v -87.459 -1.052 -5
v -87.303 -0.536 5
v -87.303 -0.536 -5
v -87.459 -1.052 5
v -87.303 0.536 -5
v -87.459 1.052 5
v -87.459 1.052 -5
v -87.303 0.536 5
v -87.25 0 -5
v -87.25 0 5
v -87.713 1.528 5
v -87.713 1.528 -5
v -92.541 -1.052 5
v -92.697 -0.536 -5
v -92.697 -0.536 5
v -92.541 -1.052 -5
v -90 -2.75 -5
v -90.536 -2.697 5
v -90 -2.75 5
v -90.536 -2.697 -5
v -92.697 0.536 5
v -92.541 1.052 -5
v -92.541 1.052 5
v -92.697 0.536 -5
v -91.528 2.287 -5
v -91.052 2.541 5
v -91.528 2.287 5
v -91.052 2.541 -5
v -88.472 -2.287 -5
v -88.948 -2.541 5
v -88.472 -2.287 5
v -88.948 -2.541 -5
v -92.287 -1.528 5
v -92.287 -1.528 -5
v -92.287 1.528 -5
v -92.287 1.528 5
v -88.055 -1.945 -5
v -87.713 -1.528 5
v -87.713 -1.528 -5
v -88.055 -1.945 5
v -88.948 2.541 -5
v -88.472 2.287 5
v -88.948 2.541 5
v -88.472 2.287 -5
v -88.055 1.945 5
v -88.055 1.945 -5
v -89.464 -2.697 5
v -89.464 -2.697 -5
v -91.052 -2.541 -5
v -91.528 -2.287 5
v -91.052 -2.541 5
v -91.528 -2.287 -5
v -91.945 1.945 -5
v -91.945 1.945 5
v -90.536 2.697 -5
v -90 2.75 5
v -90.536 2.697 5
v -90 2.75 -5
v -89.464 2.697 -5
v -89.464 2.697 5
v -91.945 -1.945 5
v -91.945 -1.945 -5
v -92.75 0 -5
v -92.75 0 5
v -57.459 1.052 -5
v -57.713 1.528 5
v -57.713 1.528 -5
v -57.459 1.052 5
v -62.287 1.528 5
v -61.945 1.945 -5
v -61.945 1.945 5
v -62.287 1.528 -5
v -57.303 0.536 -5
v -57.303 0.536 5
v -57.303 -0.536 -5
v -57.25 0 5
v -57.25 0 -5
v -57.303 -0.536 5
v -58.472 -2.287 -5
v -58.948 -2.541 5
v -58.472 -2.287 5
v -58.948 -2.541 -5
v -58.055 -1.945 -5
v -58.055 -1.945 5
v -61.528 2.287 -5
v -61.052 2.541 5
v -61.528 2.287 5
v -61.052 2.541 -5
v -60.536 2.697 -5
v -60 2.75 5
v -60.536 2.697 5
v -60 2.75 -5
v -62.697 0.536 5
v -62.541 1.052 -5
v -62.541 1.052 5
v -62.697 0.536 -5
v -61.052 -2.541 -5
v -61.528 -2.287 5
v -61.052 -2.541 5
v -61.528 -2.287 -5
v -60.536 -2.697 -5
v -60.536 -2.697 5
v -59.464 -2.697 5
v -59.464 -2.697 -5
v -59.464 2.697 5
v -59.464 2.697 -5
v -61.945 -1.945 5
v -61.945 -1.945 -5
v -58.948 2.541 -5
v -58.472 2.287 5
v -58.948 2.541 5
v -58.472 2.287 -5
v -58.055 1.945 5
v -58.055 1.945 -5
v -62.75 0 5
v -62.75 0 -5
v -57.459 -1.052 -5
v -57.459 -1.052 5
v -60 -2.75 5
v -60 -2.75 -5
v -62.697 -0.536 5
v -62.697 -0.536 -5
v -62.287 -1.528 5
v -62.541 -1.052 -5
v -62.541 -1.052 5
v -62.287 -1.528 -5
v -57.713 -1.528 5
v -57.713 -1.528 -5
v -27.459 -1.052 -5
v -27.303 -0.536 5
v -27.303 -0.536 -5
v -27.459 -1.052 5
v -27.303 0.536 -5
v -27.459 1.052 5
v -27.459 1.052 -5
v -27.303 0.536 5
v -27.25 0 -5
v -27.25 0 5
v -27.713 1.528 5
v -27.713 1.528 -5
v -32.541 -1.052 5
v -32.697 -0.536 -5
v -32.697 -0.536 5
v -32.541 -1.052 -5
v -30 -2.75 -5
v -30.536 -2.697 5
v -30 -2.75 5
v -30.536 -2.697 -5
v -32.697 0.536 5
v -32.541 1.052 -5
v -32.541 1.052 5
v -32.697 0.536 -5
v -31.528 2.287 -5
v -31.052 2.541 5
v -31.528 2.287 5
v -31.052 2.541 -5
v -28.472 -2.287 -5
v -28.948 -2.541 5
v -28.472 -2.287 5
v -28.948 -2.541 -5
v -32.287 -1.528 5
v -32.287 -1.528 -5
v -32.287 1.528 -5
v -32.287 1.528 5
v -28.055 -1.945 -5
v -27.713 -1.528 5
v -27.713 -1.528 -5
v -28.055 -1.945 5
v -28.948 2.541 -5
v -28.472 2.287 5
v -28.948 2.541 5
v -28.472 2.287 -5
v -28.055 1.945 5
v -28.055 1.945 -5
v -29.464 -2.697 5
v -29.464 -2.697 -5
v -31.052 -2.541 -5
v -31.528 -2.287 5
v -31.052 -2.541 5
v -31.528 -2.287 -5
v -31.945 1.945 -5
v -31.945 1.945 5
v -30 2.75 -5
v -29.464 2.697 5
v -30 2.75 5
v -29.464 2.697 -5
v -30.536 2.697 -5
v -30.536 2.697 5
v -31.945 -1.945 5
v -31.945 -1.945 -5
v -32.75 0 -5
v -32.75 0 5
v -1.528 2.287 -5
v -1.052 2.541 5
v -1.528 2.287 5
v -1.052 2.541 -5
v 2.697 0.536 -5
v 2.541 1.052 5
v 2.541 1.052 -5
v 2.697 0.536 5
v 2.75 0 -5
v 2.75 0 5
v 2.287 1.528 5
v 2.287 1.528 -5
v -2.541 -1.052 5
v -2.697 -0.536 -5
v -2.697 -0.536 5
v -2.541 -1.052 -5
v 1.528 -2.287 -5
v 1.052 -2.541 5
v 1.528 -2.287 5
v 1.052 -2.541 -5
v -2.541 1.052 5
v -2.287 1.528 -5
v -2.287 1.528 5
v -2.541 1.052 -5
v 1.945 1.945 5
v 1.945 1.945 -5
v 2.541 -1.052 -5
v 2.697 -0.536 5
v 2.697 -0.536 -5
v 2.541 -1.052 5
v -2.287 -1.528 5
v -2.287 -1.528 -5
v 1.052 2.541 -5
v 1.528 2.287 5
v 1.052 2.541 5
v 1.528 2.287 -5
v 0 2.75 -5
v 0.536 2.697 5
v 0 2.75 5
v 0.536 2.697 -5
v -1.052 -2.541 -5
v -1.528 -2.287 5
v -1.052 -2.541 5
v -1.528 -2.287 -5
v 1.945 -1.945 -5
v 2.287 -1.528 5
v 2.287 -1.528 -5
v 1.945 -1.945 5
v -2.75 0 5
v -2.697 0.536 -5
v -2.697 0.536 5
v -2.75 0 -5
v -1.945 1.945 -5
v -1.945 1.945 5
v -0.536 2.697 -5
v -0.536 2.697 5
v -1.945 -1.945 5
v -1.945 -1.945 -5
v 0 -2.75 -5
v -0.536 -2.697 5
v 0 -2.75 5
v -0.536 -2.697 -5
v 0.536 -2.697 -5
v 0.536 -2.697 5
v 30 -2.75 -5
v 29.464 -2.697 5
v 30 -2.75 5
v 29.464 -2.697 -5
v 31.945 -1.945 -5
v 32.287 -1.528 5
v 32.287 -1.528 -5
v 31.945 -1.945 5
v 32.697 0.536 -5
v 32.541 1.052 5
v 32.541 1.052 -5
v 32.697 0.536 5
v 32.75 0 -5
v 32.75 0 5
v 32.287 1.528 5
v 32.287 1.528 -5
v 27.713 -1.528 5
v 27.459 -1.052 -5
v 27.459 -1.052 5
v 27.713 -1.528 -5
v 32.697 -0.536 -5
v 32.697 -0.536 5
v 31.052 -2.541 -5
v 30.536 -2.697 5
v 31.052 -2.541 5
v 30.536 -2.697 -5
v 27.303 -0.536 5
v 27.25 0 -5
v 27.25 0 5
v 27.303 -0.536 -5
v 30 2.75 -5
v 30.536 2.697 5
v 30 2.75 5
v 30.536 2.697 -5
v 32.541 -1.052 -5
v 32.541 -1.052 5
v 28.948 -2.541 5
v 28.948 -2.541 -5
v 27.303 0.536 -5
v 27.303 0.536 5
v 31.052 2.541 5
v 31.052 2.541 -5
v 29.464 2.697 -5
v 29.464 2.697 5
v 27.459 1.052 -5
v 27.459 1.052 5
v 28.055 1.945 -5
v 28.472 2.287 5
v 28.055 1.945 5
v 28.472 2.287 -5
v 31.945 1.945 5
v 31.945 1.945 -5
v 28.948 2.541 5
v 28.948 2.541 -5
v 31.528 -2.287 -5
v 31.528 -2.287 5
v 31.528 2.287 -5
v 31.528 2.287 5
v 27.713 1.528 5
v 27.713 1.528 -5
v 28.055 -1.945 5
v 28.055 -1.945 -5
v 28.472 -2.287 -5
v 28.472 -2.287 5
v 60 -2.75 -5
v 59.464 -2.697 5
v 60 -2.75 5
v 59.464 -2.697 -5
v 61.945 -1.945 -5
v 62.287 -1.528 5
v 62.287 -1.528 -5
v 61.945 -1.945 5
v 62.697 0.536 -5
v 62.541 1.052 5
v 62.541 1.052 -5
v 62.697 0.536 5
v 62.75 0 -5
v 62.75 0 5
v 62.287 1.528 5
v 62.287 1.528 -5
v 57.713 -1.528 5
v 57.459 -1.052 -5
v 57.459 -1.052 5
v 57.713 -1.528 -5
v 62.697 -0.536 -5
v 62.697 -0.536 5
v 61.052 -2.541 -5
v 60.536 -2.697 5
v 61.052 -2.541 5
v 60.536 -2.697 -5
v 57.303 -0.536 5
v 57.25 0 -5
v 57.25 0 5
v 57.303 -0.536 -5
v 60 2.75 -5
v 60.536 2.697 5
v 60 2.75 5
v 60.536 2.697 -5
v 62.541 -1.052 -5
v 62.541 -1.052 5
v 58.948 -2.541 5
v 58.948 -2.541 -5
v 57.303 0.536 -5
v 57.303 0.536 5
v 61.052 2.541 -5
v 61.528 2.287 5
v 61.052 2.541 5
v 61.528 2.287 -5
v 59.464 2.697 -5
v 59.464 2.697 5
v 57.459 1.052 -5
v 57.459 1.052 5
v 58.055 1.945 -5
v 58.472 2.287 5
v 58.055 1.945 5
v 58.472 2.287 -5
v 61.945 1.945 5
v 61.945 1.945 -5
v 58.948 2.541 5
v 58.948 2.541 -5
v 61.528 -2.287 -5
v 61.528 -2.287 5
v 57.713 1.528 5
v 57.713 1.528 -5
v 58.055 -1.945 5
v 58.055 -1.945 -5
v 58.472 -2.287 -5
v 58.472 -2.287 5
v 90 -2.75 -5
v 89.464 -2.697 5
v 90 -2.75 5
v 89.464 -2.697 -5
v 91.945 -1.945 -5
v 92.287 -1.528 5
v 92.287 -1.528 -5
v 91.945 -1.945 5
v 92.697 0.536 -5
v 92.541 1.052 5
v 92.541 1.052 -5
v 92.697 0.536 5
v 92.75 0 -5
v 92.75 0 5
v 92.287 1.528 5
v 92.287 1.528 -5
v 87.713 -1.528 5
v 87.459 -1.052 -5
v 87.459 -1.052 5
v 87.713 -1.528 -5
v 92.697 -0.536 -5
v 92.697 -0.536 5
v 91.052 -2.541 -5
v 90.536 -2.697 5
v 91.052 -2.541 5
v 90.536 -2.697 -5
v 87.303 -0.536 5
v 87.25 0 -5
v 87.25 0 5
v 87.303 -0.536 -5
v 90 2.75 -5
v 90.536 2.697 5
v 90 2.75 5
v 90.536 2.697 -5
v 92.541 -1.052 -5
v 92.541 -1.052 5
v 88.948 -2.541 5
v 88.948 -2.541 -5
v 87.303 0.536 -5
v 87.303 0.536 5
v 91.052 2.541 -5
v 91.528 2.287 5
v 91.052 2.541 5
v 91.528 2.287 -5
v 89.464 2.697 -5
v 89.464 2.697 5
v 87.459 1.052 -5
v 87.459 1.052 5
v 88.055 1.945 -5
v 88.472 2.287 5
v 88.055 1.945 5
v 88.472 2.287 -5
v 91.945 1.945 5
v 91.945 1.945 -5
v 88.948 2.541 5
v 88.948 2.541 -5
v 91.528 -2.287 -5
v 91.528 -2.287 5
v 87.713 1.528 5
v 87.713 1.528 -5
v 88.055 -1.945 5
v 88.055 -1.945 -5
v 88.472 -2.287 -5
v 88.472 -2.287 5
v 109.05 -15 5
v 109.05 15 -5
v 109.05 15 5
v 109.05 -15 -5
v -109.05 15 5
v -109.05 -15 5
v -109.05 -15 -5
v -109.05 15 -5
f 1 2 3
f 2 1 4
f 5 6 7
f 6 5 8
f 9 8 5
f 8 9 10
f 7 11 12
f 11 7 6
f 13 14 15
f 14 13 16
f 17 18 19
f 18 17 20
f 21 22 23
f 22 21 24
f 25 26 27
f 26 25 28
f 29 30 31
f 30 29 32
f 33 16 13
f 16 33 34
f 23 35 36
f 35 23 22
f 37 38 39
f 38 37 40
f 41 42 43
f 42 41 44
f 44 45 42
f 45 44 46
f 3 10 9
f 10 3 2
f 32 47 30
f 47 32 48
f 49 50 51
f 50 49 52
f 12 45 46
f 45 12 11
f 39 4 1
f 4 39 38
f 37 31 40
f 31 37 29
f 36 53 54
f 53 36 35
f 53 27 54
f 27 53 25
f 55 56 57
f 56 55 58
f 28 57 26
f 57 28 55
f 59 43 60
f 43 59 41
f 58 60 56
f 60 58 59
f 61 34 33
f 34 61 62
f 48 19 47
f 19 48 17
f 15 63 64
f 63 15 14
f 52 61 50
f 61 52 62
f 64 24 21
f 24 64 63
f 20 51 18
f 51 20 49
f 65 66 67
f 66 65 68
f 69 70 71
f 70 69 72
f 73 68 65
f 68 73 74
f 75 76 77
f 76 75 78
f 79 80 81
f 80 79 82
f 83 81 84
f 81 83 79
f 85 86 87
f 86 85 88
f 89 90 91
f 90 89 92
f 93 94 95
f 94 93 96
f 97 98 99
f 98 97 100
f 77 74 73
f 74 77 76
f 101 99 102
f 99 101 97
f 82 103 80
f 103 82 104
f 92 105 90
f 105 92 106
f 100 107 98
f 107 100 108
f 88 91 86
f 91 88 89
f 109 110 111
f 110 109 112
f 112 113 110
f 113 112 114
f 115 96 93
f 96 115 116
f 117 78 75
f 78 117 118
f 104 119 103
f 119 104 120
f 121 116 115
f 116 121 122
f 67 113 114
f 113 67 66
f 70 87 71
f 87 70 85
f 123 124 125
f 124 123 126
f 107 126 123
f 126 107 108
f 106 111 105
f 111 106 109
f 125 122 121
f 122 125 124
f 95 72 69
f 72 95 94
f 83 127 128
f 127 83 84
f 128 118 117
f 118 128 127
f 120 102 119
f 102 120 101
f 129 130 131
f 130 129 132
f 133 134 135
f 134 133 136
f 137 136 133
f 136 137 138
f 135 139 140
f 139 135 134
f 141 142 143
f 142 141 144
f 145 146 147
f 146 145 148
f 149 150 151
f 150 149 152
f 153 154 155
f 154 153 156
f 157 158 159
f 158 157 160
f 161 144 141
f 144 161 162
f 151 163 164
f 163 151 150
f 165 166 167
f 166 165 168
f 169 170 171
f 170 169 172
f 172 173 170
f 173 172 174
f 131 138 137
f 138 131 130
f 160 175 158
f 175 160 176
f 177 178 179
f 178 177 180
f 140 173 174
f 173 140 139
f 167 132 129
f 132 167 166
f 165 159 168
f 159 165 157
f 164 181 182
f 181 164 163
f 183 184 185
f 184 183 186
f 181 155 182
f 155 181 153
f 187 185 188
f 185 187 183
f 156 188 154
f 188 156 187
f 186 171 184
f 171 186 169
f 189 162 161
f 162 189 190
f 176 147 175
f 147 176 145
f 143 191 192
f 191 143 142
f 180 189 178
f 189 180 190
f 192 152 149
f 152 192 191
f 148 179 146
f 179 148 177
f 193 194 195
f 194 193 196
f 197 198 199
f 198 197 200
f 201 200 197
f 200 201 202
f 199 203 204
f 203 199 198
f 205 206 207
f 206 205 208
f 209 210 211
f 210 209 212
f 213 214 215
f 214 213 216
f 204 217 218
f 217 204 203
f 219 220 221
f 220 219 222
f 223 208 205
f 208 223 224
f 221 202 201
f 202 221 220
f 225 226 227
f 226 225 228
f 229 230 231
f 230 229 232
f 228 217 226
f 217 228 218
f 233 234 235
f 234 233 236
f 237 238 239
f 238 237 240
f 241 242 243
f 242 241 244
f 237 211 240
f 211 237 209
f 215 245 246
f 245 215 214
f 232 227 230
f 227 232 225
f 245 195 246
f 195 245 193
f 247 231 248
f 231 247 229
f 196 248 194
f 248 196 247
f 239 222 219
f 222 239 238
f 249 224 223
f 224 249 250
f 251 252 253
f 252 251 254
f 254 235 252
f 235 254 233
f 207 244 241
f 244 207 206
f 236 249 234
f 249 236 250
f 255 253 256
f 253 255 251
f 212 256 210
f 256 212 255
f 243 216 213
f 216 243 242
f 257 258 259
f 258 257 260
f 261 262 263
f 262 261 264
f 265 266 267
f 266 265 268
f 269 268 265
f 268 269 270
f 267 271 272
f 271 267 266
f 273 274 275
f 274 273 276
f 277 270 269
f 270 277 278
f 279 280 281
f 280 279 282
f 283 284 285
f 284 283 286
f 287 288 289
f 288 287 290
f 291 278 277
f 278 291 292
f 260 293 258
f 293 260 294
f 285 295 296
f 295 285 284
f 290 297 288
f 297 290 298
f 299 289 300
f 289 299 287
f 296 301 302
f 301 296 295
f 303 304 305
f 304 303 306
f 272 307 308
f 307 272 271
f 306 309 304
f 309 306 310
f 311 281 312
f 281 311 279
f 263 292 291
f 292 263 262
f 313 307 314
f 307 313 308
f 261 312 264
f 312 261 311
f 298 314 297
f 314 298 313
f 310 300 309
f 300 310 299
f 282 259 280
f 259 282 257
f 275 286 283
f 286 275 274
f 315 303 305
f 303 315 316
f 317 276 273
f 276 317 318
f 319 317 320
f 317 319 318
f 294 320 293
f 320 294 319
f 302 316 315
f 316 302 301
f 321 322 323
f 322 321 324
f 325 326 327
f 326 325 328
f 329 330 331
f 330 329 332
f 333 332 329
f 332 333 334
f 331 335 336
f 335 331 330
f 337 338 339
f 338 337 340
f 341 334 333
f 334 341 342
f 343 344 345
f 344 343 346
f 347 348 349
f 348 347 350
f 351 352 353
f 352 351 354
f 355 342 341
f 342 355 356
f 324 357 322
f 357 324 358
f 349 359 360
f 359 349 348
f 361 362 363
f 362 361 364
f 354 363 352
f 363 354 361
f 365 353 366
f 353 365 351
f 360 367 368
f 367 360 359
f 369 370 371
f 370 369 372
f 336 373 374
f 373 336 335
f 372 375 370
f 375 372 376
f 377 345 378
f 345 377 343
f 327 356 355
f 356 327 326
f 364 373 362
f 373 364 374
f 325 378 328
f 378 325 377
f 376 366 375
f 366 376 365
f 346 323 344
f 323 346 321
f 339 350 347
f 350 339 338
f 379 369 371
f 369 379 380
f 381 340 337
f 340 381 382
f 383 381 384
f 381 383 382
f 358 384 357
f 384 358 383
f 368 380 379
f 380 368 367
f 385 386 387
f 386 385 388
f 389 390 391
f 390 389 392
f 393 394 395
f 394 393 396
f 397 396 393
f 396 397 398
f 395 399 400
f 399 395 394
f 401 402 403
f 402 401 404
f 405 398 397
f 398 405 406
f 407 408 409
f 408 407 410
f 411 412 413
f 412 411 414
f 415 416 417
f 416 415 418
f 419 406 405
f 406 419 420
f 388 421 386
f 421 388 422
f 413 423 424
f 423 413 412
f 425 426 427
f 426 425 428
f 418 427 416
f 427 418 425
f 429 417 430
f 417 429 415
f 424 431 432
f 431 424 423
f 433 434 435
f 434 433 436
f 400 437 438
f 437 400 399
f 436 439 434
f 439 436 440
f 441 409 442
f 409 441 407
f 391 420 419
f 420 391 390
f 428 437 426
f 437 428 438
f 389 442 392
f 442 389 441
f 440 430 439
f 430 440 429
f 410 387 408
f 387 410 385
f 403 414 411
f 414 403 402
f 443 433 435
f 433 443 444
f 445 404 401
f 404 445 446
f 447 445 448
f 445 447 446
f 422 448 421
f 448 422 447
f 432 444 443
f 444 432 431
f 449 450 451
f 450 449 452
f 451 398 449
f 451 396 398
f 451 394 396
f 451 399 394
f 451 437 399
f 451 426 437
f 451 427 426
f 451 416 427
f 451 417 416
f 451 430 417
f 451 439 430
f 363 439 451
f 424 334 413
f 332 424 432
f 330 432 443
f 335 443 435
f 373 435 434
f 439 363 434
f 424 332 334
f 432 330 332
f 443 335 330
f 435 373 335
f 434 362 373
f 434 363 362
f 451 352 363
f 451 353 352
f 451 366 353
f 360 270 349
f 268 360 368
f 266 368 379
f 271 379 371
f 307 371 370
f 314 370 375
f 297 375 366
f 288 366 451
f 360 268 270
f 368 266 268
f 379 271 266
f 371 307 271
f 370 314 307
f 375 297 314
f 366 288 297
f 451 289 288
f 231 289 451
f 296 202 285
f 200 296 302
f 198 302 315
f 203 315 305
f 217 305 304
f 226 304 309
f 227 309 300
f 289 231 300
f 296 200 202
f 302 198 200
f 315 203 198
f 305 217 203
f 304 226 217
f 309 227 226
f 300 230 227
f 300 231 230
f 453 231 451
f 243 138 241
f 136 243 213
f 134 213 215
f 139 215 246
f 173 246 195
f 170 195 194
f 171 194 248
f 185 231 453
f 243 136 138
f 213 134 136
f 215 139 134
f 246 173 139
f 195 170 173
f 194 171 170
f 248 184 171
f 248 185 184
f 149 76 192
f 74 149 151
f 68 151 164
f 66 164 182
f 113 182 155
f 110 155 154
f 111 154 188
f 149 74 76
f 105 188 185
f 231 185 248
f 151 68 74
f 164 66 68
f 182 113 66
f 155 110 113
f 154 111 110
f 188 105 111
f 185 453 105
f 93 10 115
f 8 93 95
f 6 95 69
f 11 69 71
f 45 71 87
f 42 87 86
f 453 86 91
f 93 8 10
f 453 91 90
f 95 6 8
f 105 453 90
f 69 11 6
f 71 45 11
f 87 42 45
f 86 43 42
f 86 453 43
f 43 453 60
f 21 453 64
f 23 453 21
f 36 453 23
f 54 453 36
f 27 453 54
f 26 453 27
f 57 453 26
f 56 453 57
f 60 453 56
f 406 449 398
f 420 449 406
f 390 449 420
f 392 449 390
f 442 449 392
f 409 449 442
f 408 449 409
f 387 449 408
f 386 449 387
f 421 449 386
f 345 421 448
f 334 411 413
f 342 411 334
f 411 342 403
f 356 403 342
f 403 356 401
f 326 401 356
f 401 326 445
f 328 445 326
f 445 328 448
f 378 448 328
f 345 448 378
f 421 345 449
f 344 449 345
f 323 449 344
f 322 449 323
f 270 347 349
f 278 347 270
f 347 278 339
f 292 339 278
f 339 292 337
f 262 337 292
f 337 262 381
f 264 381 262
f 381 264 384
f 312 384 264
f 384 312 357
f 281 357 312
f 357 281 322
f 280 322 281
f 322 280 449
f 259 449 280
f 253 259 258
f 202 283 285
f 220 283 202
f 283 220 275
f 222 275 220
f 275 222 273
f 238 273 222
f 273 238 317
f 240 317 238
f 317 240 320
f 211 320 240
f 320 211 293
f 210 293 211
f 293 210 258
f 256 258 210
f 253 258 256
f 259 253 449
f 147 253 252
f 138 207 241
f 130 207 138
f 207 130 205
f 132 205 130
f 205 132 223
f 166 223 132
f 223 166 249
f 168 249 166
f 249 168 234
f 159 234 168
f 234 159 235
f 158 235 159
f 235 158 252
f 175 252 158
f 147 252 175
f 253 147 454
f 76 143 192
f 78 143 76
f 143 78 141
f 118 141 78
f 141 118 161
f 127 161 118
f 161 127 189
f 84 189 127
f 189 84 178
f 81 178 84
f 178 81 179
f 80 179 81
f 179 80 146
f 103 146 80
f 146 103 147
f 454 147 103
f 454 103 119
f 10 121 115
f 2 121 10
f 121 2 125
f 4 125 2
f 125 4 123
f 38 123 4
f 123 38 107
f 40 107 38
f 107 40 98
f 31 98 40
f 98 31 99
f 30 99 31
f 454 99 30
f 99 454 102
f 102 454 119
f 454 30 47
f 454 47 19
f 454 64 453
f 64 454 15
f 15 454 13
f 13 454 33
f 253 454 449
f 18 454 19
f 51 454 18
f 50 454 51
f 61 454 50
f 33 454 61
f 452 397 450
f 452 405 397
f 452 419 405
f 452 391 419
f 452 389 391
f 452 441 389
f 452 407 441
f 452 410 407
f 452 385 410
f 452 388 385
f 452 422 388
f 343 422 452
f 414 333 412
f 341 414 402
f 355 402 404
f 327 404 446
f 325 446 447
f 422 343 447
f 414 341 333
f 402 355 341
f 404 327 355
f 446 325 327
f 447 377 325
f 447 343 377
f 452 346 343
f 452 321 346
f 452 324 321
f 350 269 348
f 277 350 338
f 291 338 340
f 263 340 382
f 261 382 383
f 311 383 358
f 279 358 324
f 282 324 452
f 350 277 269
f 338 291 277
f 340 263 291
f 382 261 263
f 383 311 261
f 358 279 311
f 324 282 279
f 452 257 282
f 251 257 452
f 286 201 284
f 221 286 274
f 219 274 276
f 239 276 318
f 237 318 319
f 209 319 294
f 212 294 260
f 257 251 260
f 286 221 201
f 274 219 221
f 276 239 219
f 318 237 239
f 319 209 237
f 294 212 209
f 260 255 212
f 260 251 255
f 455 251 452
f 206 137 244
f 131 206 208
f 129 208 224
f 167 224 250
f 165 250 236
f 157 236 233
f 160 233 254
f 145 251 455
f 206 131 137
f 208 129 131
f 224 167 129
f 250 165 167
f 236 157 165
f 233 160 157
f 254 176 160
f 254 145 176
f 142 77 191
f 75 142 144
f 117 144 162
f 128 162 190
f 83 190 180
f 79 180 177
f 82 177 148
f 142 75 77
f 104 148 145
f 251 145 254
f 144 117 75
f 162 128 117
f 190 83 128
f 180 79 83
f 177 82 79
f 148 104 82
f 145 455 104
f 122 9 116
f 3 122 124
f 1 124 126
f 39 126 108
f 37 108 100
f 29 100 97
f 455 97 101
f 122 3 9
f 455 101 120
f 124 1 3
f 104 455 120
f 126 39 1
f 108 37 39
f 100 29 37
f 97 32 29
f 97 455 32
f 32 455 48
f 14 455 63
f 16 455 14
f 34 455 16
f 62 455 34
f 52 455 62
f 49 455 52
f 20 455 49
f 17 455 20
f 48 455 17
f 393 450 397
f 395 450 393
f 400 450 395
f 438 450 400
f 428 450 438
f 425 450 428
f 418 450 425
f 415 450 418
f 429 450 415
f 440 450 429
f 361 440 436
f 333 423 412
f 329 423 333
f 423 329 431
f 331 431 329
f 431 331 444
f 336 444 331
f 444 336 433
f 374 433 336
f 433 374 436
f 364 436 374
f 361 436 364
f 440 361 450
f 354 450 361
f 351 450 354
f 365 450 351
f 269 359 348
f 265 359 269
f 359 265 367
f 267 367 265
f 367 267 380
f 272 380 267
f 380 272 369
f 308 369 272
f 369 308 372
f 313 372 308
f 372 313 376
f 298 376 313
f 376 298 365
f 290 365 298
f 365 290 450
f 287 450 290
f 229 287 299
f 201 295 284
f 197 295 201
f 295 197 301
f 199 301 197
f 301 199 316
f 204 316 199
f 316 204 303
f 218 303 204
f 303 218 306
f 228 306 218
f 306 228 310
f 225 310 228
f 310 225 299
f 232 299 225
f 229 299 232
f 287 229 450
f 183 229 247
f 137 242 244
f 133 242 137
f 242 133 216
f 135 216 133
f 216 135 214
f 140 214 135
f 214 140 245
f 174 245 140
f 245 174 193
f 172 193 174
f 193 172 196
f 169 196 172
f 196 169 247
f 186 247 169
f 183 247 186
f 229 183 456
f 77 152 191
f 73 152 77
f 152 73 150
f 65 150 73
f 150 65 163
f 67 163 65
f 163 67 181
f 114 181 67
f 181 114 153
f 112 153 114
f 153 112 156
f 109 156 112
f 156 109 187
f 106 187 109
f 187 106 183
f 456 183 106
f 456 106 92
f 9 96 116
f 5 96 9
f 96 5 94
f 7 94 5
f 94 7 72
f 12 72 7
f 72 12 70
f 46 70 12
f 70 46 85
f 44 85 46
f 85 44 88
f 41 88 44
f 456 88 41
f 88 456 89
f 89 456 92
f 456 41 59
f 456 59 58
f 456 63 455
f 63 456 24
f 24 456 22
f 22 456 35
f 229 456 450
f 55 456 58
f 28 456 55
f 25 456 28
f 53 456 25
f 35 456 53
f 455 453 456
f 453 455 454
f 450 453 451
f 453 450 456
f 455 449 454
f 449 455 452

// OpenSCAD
$fn = 32;

// ----------------------------------------------------------------------
// Hole bar, 7 x Ø5.5
// skip layout, 19.05 mm edge offset
// ----------------------------------------------------------------------

// --- parameters (mm) ---
bar_w = 30;       // bar width (Y)
bar_t = 10;       // bar thickness (Z)
holes = 7;        // holes per row
hole_d = 5.5;     // hole diameter
edge = 19.05;     // offset from the bar end to the first hole
grid_pitch = 15;  // grid the bar was laid out on

// --- derived feature positions (mm) ---
pitch = grid_pitch * 2;       // = 30   holes sit every other grid slot
span = (holes - 1) * pitch;   // = 180   distance between the end holes
bar_l = span + 2 * edge;      // = 218.1   overall bar length
start_x = -bar_l / 2 + edge;  // = -90   X of the first hole
feature_centers = [
  [start_x + 0 * pitch, 0],
  [start_x + 1 * pitch, 0],
  [start_x + 2 * pitch, 0],
  [start_x + 3 * pitch, 0],
  [start_x + 4 * pitch, 0],
  [start_x + 5 * pitch, 0],
  [start_x + 6 * pitch, 0]
];   // hole centres of the first row

// bar with one row of holes, drilled from feature_centers
difference() {
  translate([-bar_l / 2, -bar_w / 2, -bar_t / 2]) cube([bar_l, bar_w, bar_t]);
  for (centre = feature_centers)
    translate([centre[0], centre[1], 0])
      cylinder(d = hole_d, h = bar_t + 2, center = true);
}
